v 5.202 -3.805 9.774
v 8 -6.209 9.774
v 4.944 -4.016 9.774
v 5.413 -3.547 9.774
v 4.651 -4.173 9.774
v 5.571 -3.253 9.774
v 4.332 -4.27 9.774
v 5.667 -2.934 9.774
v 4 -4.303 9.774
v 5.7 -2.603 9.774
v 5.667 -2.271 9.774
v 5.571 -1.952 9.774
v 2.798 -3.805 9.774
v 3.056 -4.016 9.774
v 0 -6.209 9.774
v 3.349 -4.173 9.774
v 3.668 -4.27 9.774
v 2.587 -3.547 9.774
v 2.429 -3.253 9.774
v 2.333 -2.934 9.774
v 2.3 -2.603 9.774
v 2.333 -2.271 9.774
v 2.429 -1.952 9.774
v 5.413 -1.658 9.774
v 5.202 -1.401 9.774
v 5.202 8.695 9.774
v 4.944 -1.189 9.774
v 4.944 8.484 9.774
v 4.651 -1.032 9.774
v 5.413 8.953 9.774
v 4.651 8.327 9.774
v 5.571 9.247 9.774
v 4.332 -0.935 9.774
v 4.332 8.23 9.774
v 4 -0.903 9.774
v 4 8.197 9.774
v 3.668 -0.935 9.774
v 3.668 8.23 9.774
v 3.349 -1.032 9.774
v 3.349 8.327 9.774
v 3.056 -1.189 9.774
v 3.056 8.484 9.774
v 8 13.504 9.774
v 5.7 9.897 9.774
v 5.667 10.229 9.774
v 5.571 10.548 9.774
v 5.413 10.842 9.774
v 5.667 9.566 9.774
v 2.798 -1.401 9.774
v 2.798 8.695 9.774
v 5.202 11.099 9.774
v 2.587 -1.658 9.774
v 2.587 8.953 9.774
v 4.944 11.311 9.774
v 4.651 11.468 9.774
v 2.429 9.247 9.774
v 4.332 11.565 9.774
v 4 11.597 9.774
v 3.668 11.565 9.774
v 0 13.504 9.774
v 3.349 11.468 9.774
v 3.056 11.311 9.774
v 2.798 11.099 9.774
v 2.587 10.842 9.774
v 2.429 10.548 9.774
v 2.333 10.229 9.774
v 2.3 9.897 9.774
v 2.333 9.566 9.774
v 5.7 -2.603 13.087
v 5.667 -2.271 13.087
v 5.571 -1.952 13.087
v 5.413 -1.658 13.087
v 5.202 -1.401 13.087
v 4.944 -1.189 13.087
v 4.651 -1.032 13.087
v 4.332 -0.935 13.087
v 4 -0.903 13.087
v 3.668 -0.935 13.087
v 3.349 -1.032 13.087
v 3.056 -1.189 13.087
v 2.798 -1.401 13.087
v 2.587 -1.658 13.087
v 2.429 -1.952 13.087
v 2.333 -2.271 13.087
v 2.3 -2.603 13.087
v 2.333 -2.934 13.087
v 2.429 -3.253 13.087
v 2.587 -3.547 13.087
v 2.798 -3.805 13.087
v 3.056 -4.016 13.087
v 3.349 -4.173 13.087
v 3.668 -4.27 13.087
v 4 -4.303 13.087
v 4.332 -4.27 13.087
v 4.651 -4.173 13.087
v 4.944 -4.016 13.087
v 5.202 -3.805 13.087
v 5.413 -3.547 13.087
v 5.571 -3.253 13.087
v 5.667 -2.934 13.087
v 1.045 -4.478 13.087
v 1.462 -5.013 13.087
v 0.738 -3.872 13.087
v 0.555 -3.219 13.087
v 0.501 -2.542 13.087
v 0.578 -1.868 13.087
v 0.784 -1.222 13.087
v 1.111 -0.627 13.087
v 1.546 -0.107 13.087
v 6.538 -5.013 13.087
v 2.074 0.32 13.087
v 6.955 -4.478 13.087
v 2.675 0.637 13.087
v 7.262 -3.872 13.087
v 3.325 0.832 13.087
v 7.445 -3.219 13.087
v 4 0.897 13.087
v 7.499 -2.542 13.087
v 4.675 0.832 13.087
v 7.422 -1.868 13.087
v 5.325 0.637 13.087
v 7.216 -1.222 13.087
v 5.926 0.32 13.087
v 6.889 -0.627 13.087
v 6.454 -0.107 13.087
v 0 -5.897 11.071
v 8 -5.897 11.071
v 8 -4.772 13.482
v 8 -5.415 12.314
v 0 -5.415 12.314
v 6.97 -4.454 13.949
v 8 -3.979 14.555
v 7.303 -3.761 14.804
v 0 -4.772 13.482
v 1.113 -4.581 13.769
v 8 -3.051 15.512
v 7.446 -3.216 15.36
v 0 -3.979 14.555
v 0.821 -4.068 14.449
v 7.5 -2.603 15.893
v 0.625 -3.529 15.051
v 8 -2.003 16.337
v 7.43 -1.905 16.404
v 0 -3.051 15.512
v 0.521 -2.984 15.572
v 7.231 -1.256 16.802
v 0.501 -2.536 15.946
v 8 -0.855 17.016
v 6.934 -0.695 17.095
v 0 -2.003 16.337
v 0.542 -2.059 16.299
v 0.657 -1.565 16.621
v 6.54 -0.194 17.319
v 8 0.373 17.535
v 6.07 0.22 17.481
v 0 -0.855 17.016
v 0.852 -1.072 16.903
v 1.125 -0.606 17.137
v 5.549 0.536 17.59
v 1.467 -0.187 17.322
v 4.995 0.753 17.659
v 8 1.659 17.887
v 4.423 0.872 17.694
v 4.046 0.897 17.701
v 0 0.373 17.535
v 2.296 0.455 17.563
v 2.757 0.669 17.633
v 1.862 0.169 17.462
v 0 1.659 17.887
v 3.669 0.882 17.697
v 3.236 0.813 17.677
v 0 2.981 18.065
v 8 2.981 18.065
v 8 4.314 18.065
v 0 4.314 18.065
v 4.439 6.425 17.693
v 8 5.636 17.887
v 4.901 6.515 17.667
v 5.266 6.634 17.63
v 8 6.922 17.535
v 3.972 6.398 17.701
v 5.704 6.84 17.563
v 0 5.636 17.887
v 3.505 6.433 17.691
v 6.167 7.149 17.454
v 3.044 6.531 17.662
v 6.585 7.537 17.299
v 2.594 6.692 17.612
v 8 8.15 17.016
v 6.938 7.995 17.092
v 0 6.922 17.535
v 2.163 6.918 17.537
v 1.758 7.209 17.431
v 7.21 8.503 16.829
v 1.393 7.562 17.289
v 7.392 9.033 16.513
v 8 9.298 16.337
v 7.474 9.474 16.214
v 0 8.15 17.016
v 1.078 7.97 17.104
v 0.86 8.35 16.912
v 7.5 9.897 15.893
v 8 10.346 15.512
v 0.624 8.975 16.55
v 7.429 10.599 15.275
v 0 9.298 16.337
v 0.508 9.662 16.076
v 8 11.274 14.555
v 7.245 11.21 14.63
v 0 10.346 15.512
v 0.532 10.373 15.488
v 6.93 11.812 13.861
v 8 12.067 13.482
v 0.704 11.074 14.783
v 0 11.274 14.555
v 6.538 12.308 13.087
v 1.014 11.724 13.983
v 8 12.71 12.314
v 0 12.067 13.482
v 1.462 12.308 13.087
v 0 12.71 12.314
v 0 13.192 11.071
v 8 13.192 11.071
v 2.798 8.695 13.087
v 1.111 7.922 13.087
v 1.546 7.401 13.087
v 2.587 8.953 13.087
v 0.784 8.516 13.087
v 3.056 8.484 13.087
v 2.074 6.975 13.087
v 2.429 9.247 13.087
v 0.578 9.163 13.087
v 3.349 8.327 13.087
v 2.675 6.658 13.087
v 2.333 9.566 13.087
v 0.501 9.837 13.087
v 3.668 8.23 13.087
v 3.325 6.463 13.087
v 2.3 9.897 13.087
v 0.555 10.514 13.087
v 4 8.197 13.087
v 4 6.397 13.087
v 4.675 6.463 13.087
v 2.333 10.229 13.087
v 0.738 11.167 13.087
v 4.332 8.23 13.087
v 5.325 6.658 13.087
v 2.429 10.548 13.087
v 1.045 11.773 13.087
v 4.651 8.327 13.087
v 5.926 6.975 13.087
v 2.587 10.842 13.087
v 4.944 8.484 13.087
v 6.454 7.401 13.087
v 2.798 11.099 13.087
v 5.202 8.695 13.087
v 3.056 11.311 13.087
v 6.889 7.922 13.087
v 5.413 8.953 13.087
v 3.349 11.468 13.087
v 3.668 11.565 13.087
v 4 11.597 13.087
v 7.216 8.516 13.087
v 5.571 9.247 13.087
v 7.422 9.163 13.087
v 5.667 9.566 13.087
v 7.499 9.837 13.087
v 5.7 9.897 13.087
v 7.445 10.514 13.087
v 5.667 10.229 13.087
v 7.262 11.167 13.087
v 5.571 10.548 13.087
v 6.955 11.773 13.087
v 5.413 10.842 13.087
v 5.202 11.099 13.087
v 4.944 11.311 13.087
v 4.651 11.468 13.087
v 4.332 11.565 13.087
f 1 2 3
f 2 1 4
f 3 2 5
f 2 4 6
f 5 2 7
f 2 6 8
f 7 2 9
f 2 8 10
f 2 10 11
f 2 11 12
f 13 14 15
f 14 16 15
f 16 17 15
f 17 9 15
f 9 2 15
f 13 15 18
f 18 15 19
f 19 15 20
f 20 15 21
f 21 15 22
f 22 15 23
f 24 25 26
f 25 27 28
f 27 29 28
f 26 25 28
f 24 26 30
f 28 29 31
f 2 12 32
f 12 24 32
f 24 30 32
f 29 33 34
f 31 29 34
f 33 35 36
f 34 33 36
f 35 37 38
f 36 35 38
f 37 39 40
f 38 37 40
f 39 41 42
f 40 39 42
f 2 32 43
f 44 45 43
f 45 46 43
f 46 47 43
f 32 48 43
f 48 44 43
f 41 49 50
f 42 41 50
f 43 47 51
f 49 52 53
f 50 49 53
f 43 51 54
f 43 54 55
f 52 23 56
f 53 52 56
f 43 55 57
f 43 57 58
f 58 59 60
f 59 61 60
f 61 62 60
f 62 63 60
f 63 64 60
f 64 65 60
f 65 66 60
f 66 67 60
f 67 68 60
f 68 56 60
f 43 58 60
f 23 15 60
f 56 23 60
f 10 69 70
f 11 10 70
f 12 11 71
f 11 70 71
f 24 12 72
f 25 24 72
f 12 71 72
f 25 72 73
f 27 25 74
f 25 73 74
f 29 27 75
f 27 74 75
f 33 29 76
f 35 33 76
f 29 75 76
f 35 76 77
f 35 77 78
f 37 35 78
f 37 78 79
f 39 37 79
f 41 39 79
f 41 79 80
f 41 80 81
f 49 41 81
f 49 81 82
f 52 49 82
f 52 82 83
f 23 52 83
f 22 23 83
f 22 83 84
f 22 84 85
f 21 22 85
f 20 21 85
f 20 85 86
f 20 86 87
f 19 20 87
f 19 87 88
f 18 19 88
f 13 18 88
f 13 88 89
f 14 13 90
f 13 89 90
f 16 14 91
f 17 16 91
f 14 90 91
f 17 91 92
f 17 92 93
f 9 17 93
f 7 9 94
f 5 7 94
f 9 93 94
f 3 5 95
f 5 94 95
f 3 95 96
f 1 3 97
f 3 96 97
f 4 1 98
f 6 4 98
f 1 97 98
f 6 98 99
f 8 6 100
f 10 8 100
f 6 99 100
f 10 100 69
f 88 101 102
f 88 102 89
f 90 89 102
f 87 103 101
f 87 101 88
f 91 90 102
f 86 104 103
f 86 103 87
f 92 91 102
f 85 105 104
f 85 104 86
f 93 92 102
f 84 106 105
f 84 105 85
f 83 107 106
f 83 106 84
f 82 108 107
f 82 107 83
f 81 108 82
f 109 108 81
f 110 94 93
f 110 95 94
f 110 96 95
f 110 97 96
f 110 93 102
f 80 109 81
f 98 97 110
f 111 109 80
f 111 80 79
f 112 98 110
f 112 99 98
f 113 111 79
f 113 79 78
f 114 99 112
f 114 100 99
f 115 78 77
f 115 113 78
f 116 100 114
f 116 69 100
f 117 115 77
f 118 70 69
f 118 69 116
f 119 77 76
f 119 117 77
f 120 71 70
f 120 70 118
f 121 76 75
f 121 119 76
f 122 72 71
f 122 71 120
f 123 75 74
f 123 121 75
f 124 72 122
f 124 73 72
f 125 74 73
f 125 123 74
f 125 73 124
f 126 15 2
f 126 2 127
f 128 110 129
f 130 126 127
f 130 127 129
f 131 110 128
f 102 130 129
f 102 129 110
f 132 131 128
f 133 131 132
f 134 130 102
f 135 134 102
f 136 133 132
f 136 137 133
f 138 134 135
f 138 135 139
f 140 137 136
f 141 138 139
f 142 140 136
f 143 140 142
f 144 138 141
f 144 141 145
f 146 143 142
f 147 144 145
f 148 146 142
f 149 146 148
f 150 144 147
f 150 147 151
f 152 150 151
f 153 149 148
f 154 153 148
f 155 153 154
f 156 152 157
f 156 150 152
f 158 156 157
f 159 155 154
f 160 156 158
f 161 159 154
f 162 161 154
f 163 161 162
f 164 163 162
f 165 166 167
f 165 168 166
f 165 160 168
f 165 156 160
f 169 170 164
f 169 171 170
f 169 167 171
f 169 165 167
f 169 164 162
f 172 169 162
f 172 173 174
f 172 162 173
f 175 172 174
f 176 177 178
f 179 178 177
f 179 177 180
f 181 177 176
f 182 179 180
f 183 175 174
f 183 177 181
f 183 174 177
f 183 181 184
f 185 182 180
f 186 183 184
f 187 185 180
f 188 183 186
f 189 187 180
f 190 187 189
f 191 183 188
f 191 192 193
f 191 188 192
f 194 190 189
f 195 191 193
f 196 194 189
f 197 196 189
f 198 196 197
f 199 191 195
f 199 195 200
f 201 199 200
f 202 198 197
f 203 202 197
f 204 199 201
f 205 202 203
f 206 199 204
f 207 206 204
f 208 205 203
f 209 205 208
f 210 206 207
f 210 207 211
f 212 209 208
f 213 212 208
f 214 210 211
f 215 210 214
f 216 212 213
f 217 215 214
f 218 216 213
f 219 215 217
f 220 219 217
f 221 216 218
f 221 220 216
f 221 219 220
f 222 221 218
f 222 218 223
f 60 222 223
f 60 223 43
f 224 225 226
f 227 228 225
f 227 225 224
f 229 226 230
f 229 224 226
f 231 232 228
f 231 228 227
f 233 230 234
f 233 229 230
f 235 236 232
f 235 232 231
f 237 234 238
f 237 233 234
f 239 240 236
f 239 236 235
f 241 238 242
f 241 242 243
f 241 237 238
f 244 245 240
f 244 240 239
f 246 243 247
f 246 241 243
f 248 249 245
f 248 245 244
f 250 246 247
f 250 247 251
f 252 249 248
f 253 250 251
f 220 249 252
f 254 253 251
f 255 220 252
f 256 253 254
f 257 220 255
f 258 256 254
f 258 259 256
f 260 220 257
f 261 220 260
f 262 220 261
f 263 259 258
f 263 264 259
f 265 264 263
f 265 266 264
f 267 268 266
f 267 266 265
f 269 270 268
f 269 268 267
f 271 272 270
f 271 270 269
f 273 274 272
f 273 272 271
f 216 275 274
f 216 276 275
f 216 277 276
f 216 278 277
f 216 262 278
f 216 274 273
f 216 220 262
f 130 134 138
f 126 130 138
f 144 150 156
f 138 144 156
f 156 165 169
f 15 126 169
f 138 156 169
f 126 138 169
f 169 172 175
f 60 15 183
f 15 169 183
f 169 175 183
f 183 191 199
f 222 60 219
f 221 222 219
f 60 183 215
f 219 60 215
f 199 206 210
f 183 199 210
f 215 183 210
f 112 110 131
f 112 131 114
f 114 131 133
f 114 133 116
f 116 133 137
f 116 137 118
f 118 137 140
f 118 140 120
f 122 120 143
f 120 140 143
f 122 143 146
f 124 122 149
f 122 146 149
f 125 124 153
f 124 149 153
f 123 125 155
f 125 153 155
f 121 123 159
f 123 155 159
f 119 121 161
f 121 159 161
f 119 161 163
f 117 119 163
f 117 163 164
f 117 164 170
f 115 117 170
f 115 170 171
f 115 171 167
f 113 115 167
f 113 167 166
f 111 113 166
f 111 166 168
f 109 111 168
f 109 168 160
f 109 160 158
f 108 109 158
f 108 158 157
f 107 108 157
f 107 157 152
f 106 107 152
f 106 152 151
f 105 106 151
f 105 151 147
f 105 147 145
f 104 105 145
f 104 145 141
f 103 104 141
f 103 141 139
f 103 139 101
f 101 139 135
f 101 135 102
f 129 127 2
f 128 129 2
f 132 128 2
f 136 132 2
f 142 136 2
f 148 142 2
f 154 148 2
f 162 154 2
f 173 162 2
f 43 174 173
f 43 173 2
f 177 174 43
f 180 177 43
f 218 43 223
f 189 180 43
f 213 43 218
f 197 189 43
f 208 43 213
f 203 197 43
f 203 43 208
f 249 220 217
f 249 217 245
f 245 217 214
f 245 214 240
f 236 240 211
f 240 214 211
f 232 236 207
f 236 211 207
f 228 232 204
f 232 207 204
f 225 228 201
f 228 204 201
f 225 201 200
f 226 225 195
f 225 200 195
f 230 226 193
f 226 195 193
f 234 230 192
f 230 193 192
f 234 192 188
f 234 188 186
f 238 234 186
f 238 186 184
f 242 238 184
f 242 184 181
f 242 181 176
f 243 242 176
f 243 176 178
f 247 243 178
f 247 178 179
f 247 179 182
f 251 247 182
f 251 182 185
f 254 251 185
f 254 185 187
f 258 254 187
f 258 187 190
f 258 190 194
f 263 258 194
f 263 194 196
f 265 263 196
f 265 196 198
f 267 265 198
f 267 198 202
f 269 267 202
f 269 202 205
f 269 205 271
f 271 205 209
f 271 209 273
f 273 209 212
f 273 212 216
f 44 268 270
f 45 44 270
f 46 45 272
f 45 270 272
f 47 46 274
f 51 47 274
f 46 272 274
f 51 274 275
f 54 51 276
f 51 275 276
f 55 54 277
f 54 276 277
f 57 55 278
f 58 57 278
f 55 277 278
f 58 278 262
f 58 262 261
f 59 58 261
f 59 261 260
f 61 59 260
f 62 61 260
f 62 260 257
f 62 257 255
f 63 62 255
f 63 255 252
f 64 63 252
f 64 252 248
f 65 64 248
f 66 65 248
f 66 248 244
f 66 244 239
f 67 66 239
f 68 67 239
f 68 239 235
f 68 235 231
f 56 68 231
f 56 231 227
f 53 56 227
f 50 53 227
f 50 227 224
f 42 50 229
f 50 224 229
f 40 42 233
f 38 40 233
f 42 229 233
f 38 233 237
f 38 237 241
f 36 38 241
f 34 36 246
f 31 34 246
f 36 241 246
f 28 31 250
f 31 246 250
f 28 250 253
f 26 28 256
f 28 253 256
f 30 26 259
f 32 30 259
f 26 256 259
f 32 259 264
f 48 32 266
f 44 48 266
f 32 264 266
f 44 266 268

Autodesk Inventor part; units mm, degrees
ref_plane "YZ Plane" through (0, 0, 0) normal (1, 0, 0) x (0, 1, 0)
ref_plane "XZ Plane" through (0, 0, 0) normal (0, 1, 0) x (-1, 0, 0)
sketch "スケッチ1" plane through (0, 0, 0) normal (1, 0, 0) x (0, 1, 0)
  circle A0 centre (3.6474, 8.0868) radius 10
  circle A1 centre (3.6474, 8.0868) radius 2.1
  line L0 (2.3974, 9.7742) -> (4.8974, 9.7742)
  line L1 (-4.3526, 14.0868) -> (-4.3526, 2.0868) construction
  line L2 (-1.3526, 16.747) -> (-1.3526, -0.5735) construction
  line L3 (2.3974, 9.7742) -> (13.504, 9.7742)
  line L4 (13.504, 9.7742) -> (-6.2092, 9.7742)
  point P0 (0, 0)
  point P1 (-6.3526, 8.0868)
  dimension "d0" = 20
  dimension "d1" = 4.2
  dimension "d2" = 2.5
  dimension "d3" = 3
  dimension "d4" = 5
extrude "押し出し1" add sketch "スケッチ1" along normal blind 8 contours L3 A1 L4 A0 | L0 A1 picked at (-3.121, 10.5193) picked at (3.6474, 9.9117)
ref_plane "作業平面1" through (0, 3.6474, 18.0868) normal (0, 0, 1) x (1, 0, 0)
sketch "スケッチ2" plane through (0, 3.6474, 18.0868) normal (0, 0, 1) x (1, 0, 0)
  circle A0 centre (4, -6.25) radius 1.7
  line L0 (8, -9.8566) -> (8, 9.8566) projected
  line L1 (0, -9.8566) -> (0, 9.8566) projected
  line L2 (0, -1.25) -> (8, -1.25)
  line L3 (8, 0) -> (0, 0)
  circle A1 centre (4, 6.25) radius 1.7
  circle A2 centre (4, -6.25) radius 3.5
  circle A3 centre (4, 6.25) radius 3.5
  point P0 (0, -3.6474)
  dimension "d7" = 3.4
  dimension "d9" = 4
  dimension "d10" = 1.25
  dimension "d11" = 5
  dimension "d14" = 7
  dimension "d15" = 7
extrude "押し出し2" cut sketch "スケッチ2" against normal blind 15 contours A0 | A1
extrude "押し出し3" cut sketch "スケッチ2" against normal blind 5 contours A0 | A2 | A3
properties part number "RZvector-v1-3DP-E-F" material "ABS プラスチック"
